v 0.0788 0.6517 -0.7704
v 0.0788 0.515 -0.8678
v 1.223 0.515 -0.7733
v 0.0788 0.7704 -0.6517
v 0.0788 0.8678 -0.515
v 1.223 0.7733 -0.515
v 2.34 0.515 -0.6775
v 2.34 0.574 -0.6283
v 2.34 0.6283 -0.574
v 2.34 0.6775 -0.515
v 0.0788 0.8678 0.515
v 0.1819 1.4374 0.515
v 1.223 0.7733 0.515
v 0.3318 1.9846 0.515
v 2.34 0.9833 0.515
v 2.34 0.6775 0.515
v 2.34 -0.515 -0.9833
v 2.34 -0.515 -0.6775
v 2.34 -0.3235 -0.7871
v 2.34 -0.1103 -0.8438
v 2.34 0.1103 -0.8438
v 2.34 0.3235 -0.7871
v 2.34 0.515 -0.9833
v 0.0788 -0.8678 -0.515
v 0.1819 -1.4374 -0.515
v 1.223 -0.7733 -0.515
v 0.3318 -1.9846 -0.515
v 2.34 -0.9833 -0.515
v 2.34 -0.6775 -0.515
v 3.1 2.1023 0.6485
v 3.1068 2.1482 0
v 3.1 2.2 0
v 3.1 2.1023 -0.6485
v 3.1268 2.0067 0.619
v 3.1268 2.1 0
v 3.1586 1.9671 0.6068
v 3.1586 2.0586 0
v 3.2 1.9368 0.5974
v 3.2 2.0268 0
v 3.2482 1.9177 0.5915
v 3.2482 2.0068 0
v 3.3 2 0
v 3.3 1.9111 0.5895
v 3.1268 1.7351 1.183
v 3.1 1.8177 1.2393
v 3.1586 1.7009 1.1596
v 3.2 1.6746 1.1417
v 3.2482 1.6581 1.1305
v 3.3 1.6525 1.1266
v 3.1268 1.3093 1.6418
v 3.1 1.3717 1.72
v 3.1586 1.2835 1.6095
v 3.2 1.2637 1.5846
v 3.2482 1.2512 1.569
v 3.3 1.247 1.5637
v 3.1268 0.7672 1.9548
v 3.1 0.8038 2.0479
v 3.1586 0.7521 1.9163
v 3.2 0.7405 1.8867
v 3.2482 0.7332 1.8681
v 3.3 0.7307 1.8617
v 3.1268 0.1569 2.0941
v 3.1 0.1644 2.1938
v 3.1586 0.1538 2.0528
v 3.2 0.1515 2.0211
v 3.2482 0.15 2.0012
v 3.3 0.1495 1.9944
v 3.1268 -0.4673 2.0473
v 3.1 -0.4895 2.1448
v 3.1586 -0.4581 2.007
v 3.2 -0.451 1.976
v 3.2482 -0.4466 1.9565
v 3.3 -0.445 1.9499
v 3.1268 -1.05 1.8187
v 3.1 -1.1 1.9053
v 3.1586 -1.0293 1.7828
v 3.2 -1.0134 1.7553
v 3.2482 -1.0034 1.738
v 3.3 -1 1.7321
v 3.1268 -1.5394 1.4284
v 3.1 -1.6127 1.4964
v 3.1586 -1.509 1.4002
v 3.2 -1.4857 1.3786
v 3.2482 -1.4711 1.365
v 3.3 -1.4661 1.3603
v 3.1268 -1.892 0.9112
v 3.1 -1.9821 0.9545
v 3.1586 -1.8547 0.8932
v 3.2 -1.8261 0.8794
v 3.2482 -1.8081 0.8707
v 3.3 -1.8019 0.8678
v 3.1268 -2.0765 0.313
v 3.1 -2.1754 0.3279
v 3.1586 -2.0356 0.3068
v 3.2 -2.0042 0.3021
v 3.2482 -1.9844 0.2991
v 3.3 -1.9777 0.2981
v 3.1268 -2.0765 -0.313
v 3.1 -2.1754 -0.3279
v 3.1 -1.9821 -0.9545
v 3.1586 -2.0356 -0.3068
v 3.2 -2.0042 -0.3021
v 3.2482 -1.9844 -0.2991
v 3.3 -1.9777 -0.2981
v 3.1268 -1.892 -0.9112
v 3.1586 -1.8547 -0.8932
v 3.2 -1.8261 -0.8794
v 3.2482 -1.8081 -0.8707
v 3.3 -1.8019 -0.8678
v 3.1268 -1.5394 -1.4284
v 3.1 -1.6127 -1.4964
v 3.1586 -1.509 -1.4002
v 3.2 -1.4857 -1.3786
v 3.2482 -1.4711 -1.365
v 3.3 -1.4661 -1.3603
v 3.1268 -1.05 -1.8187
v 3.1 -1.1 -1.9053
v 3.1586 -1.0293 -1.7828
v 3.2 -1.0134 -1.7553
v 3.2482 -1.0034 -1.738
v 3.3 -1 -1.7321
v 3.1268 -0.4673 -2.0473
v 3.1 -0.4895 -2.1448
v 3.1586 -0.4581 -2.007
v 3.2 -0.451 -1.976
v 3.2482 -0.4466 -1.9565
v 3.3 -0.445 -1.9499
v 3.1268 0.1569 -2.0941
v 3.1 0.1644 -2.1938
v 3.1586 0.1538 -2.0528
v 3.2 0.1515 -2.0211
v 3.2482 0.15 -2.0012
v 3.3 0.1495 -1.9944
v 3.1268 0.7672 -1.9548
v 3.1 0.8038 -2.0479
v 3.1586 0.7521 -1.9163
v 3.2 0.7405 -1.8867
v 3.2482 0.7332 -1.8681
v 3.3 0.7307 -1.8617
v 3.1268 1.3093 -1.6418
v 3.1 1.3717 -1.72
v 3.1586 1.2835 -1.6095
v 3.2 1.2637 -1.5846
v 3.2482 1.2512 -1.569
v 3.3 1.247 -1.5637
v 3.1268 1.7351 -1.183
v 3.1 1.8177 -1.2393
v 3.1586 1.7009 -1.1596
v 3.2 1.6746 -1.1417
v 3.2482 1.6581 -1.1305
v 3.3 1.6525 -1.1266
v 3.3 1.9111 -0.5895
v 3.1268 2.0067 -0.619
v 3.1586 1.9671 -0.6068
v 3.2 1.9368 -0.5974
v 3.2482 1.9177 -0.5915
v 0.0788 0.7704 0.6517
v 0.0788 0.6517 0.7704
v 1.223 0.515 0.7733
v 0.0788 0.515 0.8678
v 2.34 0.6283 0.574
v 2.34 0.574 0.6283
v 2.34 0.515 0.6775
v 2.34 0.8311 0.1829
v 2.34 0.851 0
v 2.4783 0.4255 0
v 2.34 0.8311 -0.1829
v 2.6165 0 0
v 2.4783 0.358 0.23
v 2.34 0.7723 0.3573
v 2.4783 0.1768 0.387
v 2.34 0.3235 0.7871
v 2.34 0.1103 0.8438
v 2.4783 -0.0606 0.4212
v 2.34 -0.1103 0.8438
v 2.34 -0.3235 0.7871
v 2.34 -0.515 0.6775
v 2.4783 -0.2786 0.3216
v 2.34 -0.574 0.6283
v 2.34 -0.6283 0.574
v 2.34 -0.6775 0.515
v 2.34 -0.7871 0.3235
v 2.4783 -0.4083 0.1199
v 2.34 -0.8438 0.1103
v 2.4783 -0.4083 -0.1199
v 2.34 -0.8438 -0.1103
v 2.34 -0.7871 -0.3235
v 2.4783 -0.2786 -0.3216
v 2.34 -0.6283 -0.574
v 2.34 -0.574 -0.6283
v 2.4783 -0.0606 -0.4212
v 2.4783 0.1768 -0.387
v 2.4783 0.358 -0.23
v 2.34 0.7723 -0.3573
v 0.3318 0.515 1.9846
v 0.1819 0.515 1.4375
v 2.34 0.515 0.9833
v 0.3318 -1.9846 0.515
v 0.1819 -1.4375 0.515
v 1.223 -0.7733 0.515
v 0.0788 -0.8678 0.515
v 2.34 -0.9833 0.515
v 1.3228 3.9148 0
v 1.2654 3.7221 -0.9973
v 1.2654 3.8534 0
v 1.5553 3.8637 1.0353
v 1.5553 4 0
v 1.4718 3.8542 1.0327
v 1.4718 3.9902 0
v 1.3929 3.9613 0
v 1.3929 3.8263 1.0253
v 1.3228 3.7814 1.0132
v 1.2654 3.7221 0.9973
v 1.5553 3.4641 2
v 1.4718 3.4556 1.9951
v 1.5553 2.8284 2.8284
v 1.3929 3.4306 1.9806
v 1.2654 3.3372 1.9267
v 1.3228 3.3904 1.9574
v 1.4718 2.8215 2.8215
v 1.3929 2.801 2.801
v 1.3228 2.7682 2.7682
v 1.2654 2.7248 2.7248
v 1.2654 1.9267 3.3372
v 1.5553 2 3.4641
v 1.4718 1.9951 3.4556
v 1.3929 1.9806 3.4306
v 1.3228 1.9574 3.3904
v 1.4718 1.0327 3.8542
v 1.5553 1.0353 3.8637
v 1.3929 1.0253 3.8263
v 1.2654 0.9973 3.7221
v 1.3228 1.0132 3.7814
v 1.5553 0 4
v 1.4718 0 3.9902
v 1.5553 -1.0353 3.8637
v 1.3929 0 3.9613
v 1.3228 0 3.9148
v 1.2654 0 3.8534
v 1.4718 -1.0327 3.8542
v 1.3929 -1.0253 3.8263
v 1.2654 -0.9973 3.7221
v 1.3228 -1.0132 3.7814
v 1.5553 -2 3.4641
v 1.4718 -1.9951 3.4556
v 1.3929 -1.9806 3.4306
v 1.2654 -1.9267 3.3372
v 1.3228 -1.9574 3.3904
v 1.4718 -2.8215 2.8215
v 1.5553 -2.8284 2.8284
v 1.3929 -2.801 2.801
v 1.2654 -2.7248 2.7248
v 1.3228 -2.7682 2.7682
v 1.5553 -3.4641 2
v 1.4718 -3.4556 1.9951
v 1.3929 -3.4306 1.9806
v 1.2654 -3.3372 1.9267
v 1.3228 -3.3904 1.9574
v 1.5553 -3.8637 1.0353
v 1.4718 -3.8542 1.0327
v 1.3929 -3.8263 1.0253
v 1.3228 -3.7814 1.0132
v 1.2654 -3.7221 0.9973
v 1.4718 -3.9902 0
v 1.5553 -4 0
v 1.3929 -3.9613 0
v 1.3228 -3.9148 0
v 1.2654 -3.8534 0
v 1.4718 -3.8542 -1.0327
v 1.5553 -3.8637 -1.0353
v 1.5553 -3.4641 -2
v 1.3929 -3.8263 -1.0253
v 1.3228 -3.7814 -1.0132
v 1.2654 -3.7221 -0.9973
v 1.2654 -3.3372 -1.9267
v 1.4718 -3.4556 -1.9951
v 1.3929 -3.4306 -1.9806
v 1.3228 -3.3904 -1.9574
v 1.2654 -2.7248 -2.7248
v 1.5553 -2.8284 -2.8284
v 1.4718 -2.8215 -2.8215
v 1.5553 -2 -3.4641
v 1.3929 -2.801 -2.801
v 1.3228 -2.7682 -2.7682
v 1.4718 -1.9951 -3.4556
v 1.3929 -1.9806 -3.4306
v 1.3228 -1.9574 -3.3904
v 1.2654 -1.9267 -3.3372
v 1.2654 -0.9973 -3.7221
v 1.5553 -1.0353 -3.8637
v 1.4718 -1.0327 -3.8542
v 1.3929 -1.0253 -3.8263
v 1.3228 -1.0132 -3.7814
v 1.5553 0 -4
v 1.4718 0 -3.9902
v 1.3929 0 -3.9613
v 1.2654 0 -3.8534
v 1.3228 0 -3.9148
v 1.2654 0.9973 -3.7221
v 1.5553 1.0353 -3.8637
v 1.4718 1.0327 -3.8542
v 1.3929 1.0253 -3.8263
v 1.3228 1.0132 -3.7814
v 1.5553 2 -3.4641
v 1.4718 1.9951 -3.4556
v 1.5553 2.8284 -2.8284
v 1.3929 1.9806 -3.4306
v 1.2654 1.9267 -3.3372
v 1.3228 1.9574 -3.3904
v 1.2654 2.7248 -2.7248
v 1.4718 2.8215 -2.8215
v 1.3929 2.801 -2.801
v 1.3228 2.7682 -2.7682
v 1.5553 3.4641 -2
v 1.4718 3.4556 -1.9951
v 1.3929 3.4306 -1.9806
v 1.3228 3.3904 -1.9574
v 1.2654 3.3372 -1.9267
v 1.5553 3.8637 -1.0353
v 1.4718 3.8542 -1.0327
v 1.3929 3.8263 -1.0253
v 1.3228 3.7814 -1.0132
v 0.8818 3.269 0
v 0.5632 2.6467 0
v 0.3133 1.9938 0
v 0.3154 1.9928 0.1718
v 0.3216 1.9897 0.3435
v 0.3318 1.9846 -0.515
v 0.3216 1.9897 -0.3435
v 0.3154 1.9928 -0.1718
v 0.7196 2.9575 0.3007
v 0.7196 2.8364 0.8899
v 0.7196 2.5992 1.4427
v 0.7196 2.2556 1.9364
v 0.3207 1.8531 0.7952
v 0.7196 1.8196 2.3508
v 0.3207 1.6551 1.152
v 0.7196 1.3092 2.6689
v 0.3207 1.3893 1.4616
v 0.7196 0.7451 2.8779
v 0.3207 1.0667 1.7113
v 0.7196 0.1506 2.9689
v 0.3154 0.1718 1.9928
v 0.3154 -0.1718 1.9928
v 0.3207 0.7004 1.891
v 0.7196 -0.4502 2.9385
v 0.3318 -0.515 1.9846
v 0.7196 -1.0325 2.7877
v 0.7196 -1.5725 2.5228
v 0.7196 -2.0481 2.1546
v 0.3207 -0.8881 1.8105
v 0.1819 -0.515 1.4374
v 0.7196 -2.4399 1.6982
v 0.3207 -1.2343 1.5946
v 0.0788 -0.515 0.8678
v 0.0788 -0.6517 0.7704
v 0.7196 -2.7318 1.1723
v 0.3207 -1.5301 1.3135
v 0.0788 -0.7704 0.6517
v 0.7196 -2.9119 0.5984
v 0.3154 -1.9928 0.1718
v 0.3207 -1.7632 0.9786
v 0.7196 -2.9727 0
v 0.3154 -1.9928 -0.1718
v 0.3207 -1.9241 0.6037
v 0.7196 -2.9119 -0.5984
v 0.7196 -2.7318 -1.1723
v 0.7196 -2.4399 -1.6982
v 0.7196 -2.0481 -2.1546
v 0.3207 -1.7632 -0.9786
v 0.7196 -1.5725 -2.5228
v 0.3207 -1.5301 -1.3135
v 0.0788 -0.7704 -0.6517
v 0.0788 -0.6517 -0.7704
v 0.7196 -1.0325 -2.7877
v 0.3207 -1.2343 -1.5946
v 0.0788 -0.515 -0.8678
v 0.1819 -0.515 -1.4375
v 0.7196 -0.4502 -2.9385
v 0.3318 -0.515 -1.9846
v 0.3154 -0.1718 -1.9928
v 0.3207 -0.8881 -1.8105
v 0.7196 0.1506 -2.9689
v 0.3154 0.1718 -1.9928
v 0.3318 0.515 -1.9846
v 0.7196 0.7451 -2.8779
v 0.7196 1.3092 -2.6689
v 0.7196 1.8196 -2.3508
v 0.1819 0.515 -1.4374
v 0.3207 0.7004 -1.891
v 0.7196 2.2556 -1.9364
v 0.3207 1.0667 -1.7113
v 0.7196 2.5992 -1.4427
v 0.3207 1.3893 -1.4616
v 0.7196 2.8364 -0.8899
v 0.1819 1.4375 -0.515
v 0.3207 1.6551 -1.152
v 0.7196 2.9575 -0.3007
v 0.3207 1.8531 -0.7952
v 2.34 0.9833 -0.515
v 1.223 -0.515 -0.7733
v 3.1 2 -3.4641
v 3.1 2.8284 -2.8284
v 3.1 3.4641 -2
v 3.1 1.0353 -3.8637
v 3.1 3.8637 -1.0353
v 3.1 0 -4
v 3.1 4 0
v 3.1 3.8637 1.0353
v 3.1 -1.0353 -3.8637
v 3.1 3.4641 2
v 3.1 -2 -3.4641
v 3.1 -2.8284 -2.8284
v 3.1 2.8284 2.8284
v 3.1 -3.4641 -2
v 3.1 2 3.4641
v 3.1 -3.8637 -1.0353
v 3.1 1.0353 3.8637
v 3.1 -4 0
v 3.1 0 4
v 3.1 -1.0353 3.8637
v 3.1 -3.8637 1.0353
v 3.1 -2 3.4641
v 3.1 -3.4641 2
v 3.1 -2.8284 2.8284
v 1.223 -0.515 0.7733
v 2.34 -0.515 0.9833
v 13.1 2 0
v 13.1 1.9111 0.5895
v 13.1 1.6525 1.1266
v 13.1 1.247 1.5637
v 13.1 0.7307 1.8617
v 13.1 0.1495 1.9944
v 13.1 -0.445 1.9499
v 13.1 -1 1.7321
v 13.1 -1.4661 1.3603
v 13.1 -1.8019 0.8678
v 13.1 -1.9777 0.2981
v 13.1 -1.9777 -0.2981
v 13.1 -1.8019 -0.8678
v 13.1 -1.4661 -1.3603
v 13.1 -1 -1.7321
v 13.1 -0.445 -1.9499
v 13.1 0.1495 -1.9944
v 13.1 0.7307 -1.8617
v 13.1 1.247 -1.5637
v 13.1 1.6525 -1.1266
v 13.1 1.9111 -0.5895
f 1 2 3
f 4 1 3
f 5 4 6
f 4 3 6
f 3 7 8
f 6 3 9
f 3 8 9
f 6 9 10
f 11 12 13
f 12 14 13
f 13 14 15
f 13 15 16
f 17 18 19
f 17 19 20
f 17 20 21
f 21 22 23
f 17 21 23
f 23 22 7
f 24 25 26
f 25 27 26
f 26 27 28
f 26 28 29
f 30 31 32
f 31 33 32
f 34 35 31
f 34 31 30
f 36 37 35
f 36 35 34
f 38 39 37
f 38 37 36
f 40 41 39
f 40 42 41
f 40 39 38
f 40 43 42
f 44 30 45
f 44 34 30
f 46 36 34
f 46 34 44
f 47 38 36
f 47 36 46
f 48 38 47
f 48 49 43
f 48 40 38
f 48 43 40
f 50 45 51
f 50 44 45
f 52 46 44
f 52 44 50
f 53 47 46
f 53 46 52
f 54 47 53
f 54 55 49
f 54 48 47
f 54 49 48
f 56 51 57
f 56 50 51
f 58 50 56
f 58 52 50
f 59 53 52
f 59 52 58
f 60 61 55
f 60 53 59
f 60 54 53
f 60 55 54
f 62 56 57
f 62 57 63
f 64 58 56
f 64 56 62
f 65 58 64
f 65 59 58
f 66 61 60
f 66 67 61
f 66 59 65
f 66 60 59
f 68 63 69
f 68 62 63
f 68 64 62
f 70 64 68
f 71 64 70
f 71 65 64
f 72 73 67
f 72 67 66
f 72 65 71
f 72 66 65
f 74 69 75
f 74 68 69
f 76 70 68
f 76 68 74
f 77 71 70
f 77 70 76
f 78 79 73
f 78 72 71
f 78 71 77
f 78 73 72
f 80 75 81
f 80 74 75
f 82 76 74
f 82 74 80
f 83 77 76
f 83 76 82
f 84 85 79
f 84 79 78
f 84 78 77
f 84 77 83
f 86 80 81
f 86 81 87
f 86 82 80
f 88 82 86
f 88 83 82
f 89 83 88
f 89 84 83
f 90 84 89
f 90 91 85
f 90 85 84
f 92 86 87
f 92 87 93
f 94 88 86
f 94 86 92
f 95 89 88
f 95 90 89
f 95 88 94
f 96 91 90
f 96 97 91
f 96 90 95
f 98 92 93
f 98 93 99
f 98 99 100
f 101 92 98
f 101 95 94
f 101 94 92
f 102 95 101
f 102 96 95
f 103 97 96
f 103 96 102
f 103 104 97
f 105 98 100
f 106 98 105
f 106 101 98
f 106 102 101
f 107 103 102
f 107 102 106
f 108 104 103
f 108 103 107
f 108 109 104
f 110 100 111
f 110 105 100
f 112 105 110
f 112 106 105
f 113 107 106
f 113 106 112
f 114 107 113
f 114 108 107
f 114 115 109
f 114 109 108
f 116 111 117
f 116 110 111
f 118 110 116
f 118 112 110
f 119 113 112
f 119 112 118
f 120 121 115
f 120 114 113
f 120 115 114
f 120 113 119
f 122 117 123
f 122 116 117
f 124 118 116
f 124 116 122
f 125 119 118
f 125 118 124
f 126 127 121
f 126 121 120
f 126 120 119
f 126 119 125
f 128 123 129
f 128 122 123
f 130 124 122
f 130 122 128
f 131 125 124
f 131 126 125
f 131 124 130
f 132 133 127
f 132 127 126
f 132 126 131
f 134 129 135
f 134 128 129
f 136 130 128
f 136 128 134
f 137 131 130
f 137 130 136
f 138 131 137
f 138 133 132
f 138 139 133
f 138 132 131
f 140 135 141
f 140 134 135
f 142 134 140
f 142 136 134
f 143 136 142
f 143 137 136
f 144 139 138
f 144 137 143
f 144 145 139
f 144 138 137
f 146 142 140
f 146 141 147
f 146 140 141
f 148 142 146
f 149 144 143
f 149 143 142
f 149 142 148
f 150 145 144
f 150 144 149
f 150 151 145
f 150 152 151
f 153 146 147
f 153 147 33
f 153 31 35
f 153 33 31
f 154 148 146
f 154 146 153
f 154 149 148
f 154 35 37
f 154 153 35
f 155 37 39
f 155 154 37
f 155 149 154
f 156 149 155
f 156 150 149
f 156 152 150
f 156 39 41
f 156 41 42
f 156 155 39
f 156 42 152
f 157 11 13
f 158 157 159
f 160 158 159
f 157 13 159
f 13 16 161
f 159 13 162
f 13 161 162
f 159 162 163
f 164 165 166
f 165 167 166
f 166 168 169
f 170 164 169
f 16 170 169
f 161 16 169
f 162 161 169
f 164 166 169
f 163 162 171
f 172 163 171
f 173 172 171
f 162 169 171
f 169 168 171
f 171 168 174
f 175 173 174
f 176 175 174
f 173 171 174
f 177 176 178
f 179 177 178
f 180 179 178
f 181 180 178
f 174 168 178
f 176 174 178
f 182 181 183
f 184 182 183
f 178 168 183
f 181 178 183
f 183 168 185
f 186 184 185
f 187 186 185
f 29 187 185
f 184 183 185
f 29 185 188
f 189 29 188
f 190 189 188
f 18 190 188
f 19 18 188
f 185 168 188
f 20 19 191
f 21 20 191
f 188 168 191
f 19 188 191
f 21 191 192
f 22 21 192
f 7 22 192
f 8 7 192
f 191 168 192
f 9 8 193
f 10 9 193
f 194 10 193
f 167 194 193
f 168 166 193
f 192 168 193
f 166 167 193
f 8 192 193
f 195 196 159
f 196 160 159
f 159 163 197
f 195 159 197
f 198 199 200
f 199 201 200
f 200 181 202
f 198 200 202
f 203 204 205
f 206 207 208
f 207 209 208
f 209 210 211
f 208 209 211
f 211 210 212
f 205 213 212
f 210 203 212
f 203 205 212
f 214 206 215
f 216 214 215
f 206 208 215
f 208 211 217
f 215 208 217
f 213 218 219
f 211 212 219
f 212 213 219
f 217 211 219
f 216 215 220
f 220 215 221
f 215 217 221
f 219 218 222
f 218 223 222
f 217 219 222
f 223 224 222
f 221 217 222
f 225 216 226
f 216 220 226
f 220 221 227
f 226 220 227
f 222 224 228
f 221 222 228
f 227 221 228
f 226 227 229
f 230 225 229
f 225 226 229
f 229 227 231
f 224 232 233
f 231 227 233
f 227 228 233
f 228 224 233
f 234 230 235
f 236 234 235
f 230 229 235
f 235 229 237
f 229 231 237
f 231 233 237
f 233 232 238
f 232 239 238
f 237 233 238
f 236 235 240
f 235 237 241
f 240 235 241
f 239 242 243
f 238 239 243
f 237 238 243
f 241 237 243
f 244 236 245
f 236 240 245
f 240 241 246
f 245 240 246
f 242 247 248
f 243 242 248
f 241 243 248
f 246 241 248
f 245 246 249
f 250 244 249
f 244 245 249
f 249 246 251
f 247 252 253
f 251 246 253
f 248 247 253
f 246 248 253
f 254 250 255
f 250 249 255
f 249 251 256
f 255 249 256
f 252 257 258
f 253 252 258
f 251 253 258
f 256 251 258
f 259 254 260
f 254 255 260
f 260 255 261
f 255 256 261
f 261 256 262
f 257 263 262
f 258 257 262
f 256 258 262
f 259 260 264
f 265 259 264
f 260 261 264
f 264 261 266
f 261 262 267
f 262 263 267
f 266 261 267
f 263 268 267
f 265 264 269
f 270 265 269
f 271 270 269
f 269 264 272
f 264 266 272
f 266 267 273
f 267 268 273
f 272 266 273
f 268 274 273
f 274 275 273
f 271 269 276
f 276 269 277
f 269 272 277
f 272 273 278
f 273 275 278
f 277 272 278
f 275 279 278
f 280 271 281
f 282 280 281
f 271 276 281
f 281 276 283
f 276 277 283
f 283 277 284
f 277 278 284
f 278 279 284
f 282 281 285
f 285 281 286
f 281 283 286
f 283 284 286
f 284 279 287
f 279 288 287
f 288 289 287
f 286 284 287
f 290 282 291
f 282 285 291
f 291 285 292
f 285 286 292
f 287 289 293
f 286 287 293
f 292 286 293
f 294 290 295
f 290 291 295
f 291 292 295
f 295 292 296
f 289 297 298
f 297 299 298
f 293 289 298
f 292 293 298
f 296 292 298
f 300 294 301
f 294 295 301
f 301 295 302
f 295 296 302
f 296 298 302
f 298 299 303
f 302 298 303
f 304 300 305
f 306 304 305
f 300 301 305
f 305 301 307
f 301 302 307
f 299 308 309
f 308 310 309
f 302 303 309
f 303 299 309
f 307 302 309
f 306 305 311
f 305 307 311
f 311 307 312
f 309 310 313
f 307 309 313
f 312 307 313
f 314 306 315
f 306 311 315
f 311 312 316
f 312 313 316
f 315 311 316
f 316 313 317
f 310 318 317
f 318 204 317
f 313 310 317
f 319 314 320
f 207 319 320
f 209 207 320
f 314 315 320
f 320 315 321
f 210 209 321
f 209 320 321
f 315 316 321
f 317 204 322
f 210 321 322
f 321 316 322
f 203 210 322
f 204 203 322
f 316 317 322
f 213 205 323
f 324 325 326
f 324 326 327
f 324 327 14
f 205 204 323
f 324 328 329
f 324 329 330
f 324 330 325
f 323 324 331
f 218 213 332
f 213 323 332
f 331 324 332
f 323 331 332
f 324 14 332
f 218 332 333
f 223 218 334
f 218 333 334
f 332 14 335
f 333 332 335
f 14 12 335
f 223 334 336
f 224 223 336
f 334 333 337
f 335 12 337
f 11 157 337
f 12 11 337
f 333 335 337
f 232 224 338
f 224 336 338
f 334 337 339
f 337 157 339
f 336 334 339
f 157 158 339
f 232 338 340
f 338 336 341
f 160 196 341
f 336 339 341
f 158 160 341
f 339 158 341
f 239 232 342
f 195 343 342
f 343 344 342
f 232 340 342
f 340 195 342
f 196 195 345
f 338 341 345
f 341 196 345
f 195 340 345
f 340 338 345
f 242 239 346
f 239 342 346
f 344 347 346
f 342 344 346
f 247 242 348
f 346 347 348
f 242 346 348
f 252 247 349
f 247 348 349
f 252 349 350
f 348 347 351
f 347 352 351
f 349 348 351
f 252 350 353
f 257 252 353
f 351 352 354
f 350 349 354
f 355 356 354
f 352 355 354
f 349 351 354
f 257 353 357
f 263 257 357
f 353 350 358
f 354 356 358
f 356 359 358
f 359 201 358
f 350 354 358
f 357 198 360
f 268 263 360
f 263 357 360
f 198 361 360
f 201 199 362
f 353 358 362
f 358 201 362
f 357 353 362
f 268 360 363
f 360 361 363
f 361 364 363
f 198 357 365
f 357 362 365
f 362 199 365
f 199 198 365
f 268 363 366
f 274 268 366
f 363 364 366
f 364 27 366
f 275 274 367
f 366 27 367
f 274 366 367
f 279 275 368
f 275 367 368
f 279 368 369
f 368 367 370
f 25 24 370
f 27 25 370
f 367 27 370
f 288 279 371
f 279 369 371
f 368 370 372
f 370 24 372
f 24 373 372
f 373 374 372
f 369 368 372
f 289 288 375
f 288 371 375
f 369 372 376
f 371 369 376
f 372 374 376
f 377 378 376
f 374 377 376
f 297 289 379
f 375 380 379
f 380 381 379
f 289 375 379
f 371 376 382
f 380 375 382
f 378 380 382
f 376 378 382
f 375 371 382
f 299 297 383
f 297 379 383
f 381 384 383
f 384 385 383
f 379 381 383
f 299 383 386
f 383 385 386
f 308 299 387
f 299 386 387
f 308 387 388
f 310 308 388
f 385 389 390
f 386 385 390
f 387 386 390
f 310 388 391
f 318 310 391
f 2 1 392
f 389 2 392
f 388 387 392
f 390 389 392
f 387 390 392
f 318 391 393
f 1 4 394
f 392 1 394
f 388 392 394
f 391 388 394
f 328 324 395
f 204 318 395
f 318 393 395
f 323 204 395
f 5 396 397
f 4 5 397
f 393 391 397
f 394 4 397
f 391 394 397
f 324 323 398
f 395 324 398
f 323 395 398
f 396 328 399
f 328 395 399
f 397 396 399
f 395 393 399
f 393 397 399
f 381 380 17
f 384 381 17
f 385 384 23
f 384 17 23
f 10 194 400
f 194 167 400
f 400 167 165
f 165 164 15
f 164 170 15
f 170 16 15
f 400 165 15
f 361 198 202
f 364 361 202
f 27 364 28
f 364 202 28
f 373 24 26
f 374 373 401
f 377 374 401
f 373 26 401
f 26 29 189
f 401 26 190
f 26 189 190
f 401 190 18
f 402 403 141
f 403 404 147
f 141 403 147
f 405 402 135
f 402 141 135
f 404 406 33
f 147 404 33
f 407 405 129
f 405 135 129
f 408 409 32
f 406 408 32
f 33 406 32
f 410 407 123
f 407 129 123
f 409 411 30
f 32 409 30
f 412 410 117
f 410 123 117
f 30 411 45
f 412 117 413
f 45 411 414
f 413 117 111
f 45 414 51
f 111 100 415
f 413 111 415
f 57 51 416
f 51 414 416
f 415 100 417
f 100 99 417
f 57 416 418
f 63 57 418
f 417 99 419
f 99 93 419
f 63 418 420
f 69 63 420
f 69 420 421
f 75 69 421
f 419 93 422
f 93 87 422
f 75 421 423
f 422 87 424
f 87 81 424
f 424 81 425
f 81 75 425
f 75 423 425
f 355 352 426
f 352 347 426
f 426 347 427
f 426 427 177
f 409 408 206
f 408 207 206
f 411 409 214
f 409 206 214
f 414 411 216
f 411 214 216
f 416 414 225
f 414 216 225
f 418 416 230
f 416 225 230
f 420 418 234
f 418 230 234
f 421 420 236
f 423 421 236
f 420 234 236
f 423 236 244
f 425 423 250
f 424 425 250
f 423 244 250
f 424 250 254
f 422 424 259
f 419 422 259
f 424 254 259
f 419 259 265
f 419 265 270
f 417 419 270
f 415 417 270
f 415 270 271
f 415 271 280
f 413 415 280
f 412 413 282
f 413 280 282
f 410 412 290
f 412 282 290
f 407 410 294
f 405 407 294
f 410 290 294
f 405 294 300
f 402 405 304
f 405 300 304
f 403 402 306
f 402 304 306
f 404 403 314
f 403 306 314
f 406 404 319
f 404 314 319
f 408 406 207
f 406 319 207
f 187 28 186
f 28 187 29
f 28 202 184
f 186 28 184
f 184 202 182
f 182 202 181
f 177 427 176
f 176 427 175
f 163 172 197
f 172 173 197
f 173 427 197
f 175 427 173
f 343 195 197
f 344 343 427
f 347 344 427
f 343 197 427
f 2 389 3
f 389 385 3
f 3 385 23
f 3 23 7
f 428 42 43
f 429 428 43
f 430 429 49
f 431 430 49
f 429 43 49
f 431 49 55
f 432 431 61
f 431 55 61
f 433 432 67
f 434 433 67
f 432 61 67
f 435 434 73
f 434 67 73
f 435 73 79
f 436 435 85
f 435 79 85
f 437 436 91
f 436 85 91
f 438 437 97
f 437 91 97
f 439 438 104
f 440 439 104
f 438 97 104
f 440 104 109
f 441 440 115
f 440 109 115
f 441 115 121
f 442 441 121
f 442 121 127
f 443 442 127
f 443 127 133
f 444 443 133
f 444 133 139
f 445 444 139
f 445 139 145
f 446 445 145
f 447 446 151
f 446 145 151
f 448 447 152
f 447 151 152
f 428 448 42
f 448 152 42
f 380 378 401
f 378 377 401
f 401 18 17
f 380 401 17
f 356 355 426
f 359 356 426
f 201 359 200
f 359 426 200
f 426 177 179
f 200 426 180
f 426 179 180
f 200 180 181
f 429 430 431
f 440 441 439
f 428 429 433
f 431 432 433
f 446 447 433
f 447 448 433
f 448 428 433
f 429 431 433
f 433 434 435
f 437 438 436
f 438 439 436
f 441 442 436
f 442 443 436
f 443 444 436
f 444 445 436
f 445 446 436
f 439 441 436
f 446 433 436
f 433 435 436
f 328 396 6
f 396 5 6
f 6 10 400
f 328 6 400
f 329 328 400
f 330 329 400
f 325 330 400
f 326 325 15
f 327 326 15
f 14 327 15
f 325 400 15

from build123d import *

# Parameters (mm, degrees)
FILLET1_R    = 0.2
SKETCH3_W    = 1.03
SKETCH3_H    = 4.3
SKETCH4_W    = 1.03
SKETCH4_H    = 1.966638464
RECPAT_COUNT = 2
RECPAT_ANGLE = 90


with BuildPart() as part:
    # BodySke → Base-Revolve (revolve)
    with BuildSketch(Plane.XY):
        with BuildLine():
            Line((3.1, 2), (3.1, 4))
            Line((3.1, 4), (1.555305874, 4))
            ThreePointArc((1.555305874, 4), (1.392873227, 3.961271902), (1.265388955, 3.853420195))
            ThreePointArc((1.265388955, 3.853420195), (0.324444487, 2.027933456), (0, 0))
            Line((0, 0), (13.1, 0))
            Line((13.1, 0), (13.1, 2))
            Line((13.1, 2), (3.1, 2))
        make_face()
    revolve(axis=Axis((-25.4, 0, 0), (1, 0, 0)))

    # Fillet1
    fillet1_edges = [part.edges().sort_by_distance(p)[0] for p in [
        (3.1, -2, 0),
    ]]
    fillet(fillet1_edges, radius=FILLET1_R)

    # Sketch3 → Recess section 0
    with BuildSketch(Plane(origin=(0, 0, 0), x_dir=(0, 0, -1), z_dir=(1, 0, 0))):
        Rectangle(SKETCH3_W, SKETCH3_H)
    # Sketch4 → Recess section 1
    with BuildSketch(Plane(origin=(2.34, 0, 0), x_dir=(0, 0, -1), z_dir=(1, 0, 0))):
        Rectangle(SKETCH4_W, SKETCH4_H)
    recess = loft(mode=Mode.SUBTRACT)

    # RecPat: Recess ×2 about axis
    recpat_axis = Axis((0, 0, 0), (1, 0, 0))
    for i in range(1, RECPAT_COUNT):
        add(recess.rotate(recpat_axis, i * RECPAT_ANGLE / (RECPAT_COUNT - 1)), mode=Mode.SUBTRACT)

    # RecCorSke → RecessCore (revolve, cut)
    with BuildSketch(Plane.XY):
        Polygon((0, 0), (0, 1.01462874), (2.34, 0.851), (2.616506661, 0), align=None)
    revolve(axis=Axis((-3.175, 0, 0), (1, 0, 0)), mode=Mode.SUBTRACT)


solid = part.part
